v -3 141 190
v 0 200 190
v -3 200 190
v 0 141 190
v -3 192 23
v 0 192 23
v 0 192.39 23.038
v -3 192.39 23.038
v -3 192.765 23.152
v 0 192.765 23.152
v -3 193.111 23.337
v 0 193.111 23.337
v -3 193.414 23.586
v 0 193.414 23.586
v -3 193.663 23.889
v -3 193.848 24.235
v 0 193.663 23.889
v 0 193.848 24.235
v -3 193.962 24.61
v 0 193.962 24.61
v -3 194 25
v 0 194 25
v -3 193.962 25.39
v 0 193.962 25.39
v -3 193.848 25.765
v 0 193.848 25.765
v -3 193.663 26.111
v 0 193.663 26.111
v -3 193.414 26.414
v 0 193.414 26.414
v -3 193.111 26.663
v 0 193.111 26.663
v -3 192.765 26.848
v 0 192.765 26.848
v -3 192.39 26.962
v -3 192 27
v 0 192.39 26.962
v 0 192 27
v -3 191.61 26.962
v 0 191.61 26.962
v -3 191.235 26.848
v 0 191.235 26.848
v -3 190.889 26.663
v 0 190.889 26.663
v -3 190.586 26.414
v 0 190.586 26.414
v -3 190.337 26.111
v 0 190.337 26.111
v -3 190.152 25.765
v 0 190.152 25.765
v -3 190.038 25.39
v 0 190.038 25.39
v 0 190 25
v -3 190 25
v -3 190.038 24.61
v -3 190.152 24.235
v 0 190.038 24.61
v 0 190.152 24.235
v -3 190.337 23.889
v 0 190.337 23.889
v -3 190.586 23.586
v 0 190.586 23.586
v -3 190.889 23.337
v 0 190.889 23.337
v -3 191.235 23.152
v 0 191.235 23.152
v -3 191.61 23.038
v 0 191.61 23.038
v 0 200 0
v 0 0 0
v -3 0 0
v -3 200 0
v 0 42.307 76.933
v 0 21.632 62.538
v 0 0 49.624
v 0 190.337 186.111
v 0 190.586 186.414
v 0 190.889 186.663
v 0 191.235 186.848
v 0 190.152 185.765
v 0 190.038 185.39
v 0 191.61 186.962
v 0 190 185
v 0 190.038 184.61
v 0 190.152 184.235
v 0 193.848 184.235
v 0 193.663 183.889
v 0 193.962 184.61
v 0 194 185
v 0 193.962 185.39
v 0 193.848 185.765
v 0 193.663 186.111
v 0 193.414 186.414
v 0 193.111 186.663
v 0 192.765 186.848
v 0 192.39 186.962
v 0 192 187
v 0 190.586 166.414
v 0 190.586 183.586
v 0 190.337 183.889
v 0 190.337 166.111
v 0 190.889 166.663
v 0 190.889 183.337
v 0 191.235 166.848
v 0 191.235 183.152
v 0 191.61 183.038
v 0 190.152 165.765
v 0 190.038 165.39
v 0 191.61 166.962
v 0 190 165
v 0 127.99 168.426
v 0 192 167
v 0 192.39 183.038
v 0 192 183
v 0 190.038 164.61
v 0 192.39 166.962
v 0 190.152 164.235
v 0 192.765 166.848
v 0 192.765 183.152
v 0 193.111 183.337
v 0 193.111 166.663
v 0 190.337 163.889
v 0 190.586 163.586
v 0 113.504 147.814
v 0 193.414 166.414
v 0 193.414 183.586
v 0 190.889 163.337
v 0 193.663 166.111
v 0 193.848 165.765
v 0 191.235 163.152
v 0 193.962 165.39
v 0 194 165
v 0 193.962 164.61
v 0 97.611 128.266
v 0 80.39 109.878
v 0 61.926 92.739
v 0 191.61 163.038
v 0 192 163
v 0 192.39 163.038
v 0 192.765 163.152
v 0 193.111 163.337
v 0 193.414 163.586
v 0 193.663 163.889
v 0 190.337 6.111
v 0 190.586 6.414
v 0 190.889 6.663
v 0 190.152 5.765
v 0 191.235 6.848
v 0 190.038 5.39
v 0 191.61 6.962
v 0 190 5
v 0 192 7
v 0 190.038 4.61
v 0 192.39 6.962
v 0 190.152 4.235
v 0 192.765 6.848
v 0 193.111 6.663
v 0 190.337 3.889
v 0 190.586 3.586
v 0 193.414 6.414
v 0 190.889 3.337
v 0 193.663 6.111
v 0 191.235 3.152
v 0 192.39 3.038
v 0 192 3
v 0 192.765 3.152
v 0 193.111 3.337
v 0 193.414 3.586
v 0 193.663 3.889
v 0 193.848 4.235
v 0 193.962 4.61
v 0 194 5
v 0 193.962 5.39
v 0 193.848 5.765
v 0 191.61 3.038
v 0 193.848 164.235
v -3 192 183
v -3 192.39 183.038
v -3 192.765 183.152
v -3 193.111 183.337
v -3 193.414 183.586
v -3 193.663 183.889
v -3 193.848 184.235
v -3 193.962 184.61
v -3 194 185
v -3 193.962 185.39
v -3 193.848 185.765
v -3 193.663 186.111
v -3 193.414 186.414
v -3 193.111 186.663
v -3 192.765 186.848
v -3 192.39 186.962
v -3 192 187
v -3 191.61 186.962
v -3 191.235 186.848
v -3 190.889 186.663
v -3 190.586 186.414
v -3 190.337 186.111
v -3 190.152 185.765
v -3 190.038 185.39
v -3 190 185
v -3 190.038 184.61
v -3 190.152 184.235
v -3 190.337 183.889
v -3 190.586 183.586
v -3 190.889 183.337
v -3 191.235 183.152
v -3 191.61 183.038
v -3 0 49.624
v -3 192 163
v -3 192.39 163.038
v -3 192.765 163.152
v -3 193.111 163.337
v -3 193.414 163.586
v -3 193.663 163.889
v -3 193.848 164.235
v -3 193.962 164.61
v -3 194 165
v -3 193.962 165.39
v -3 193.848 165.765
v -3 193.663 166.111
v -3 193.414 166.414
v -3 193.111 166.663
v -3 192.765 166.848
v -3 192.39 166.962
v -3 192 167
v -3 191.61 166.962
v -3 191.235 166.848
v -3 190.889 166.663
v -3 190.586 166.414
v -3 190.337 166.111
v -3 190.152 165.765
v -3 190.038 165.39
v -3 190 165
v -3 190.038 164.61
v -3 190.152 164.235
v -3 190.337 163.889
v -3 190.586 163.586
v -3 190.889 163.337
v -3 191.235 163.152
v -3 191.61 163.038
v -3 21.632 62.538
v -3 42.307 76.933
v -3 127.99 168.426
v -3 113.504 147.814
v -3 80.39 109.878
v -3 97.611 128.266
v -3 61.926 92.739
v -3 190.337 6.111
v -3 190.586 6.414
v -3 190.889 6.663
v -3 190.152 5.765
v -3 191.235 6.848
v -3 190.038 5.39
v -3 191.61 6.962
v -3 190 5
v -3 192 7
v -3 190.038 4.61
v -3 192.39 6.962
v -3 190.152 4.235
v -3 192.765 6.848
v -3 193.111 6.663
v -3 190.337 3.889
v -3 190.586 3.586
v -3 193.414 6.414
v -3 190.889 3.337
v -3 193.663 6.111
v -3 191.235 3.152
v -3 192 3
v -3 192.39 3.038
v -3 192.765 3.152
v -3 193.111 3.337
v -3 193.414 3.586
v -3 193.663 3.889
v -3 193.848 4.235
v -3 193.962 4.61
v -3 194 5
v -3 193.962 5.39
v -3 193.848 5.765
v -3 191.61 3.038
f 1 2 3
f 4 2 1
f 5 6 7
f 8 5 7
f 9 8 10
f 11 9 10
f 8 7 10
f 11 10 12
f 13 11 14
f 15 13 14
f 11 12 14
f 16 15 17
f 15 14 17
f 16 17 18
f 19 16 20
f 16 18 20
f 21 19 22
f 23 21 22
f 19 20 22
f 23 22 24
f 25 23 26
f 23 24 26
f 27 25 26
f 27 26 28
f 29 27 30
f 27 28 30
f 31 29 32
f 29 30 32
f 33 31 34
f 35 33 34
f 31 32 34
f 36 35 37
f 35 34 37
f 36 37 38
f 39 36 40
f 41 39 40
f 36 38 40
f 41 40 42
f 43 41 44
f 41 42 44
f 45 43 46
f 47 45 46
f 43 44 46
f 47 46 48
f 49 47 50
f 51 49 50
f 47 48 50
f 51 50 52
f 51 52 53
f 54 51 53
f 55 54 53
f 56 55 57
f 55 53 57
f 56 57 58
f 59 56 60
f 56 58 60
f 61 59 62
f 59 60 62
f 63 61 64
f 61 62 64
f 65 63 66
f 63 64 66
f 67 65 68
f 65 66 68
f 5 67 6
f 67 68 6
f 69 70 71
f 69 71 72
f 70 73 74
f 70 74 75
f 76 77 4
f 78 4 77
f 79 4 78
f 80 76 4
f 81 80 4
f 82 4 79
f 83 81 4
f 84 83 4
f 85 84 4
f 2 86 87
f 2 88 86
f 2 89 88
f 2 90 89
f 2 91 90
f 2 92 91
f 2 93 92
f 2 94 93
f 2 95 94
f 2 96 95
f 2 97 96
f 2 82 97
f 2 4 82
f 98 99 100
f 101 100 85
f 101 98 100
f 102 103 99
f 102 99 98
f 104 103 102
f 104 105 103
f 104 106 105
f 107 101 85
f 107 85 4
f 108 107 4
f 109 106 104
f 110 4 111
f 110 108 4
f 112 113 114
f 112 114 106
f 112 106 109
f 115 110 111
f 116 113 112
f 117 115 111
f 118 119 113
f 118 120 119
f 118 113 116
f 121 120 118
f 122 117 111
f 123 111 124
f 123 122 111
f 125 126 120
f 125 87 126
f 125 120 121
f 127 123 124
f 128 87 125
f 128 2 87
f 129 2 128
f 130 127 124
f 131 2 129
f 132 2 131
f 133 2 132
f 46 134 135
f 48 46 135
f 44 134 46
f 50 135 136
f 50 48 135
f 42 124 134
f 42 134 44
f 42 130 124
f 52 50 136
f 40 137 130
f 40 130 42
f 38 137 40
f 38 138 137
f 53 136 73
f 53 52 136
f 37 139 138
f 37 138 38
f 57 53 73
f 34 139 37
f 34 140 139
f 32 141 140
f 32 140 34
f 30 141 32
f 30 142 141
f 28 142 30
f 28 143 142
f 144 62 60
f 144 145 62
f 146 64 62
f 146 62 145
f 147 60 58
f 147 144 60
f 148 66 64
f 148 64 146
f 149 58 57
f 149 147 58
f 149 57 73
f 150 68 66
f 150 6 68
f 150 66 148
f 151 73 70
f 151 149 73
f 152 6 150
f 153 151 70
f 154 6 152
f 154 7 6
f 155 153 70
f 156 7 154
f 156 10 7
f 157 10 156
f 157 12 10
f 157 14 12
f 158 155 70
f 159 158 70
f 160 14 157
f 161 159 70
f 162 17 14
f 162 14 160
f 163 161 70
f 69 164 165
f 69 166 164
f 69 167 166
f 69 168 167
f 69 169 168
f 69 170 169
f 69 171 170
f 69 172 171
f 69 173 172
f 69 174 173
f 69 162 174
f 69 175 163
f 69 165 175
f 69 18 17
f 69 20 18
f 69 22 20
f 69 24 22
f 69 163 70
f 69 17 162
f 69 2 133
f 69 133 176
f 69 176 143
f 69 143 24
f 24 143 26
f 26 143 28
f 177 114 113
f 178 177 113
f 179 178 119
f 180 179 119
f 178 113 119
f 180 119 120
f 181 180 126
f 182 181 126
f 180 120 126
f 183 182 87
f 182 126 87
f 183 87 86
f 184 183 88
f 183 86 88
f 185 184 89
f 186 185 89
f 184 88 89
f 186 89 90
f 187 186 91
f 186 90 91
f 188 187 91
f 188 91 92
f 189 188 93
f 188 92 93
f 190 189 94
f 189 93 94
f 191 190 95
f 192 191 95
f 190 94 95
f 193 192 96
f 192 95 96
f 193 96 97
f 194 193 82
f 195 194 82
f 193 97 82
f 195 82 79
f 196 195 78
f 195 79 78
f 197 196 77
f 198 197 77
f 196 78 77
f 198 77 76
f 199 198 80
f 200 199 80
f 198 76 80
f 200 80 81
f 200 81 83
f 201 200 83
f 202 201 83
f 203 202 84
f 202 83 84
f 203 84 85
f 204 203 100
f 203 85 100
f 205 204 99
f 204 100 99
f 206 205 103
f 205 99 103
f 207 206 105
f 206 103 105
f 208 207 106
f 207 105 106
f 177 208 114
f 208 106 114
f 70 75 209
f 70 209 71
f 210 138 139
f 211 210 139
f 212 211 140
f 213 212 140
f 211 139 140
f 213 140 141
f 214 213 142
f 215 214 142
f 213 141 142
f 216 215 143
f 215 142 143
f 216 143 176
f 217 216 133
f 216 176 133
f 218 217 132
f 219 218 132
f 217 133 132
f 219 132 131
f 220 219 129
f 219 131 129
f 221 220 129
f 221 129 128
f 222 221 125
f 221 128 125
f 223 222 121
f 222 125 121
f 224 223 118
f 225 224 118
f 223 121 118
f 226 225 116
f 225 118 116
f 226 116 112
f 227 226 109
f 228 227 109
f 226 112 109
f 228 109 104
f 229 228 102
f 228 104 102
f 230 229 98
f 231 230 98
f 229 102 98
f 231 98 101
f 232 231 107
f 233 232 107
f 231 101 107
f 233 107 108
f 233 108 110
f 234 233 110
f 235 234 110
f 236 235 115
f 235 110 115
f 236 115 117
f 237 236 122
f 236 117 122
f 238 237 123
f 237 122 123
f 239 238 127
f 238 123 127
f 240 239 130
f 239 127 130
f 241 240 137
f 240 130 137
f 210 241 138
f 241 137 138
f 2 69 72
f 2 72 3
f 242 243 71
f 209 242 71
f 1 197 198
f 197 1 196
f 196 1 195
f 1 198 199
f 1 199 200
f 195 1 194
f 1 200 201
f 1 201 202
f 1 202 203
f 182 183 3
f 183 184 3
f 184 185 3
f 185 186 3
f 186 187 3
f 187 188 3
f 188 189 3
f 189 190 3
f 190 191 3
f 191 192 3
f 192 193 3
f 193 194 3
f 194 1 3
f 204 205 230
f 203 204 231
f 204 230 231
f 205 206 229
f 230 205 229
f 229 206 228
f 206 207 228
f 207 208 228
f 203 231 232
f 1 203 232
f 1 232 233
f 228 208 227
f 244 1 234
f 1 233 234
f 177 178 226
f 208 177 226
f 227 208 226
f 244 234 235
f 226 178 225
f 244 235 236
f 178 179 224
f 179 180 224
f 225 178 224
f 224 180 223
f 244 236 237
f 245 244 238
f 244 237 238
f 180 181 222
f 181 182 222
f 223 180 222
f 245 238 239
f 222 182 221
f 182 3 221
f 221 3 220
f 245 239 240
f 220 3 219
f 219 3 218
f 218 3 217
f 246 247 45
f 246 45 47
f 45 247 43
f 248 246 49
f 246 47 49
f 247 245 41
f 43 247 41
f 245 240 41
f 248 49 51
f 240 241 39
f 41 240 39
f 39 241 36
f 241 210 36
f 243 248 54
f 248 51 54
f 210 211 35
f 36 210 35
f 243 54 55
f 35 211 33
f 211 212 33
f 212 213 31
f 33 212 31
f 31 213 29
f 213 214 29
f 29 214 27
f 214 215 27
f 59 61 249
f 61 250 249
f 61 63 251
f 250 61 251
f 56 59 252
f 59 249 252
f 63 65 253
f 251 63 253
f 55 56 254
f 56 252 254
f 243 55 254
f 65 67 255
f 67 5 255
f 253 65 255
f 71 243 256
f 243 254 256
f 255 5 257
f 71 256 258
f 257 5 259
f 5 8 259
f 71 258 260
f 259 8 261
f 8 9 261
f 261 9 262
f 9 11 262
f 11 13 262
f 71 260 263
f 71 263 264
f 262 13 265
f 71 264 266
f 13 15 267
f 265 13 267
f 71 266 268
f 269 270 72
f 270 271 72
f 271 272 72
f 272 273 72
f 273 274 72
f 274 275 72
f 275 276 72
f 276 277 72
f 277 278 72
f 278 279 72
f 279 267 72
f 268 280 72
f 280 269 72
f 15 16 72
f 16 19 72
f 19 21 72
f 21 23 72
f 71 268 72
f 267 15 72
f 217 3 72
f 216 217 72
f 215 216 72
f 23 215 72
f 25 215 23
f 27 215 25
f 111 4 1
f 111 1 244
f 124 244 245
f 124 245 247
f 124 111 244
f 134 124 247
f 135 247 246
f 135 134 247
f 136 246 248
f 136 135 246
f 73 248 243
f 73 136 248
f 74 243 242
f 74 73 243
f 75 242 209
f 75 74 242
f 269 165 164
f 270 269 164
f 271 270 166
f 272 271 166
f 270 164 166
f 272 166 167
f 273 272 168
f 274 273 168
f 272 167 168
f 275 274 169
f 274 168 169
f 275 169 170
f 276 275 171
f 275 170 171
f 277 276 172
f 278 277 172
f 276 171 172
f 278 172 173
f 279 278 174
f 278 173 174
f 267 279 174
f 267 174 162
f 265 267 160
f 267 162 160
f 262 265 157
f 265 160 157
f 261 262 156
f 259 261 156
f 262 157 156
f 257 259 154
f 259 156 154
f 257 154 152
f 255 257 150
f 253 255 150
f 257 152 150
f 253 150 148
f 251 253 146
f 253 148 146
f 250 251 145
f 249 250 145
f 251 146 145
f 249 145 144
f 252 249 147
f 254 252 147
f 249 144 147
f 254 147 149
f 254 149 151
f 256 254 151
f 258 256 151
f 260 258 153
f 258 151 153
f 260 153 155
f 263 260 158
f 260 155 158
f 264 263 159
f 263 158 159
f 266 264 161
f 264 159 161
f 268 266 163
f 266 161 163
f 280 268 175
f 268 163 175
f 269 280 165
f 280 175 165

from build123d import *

# Parameters (mm, degrees)
SKETCH_1_R             = 2
SM_BASE_FLANGE_1_DEPTH = 3


# Sheet-metal steps are written as plain solids
with BuildPart() as part:
    # Sketch 1 → Базовая кромка1 (new body)
    with BuildSketch(Plane(origin=(0, 0, 0), x_dir=(0, 0, -1), z_dir=(1, 0, 0))):
        with BuildLine():
            Line((-49.62399479, 0), (0, 0))
            Line((0, 0), (0, 200))
            Line((0, 200), (-190, 200))
            Line((-190, 200), (-190, 141))
            ThreePointArc((-190, 141), (-109.877663421, 80.390369629), (-49.62399479, 0))
        make_face()
        with Locations((-185, 192)):
            Circle(SKETCH_1_R, mode=Mode.SUBTRACT)
        with Locations((-165, 192)):
            Circle(SKETCH_1_R, mode=Mode.SUBTRACT)
        with Locations((-25, 192)):
            Circle(SKETCH_1_R, mode=Mode.SUBTRACT)
        with Locations((-5, 192)):
            Circle(SKETCH_1_R, mode=Mode.SUBTRACT)
    extrude(amount=-SM_BASE_FLANGE_1_DEPTH)


solid = part.part
